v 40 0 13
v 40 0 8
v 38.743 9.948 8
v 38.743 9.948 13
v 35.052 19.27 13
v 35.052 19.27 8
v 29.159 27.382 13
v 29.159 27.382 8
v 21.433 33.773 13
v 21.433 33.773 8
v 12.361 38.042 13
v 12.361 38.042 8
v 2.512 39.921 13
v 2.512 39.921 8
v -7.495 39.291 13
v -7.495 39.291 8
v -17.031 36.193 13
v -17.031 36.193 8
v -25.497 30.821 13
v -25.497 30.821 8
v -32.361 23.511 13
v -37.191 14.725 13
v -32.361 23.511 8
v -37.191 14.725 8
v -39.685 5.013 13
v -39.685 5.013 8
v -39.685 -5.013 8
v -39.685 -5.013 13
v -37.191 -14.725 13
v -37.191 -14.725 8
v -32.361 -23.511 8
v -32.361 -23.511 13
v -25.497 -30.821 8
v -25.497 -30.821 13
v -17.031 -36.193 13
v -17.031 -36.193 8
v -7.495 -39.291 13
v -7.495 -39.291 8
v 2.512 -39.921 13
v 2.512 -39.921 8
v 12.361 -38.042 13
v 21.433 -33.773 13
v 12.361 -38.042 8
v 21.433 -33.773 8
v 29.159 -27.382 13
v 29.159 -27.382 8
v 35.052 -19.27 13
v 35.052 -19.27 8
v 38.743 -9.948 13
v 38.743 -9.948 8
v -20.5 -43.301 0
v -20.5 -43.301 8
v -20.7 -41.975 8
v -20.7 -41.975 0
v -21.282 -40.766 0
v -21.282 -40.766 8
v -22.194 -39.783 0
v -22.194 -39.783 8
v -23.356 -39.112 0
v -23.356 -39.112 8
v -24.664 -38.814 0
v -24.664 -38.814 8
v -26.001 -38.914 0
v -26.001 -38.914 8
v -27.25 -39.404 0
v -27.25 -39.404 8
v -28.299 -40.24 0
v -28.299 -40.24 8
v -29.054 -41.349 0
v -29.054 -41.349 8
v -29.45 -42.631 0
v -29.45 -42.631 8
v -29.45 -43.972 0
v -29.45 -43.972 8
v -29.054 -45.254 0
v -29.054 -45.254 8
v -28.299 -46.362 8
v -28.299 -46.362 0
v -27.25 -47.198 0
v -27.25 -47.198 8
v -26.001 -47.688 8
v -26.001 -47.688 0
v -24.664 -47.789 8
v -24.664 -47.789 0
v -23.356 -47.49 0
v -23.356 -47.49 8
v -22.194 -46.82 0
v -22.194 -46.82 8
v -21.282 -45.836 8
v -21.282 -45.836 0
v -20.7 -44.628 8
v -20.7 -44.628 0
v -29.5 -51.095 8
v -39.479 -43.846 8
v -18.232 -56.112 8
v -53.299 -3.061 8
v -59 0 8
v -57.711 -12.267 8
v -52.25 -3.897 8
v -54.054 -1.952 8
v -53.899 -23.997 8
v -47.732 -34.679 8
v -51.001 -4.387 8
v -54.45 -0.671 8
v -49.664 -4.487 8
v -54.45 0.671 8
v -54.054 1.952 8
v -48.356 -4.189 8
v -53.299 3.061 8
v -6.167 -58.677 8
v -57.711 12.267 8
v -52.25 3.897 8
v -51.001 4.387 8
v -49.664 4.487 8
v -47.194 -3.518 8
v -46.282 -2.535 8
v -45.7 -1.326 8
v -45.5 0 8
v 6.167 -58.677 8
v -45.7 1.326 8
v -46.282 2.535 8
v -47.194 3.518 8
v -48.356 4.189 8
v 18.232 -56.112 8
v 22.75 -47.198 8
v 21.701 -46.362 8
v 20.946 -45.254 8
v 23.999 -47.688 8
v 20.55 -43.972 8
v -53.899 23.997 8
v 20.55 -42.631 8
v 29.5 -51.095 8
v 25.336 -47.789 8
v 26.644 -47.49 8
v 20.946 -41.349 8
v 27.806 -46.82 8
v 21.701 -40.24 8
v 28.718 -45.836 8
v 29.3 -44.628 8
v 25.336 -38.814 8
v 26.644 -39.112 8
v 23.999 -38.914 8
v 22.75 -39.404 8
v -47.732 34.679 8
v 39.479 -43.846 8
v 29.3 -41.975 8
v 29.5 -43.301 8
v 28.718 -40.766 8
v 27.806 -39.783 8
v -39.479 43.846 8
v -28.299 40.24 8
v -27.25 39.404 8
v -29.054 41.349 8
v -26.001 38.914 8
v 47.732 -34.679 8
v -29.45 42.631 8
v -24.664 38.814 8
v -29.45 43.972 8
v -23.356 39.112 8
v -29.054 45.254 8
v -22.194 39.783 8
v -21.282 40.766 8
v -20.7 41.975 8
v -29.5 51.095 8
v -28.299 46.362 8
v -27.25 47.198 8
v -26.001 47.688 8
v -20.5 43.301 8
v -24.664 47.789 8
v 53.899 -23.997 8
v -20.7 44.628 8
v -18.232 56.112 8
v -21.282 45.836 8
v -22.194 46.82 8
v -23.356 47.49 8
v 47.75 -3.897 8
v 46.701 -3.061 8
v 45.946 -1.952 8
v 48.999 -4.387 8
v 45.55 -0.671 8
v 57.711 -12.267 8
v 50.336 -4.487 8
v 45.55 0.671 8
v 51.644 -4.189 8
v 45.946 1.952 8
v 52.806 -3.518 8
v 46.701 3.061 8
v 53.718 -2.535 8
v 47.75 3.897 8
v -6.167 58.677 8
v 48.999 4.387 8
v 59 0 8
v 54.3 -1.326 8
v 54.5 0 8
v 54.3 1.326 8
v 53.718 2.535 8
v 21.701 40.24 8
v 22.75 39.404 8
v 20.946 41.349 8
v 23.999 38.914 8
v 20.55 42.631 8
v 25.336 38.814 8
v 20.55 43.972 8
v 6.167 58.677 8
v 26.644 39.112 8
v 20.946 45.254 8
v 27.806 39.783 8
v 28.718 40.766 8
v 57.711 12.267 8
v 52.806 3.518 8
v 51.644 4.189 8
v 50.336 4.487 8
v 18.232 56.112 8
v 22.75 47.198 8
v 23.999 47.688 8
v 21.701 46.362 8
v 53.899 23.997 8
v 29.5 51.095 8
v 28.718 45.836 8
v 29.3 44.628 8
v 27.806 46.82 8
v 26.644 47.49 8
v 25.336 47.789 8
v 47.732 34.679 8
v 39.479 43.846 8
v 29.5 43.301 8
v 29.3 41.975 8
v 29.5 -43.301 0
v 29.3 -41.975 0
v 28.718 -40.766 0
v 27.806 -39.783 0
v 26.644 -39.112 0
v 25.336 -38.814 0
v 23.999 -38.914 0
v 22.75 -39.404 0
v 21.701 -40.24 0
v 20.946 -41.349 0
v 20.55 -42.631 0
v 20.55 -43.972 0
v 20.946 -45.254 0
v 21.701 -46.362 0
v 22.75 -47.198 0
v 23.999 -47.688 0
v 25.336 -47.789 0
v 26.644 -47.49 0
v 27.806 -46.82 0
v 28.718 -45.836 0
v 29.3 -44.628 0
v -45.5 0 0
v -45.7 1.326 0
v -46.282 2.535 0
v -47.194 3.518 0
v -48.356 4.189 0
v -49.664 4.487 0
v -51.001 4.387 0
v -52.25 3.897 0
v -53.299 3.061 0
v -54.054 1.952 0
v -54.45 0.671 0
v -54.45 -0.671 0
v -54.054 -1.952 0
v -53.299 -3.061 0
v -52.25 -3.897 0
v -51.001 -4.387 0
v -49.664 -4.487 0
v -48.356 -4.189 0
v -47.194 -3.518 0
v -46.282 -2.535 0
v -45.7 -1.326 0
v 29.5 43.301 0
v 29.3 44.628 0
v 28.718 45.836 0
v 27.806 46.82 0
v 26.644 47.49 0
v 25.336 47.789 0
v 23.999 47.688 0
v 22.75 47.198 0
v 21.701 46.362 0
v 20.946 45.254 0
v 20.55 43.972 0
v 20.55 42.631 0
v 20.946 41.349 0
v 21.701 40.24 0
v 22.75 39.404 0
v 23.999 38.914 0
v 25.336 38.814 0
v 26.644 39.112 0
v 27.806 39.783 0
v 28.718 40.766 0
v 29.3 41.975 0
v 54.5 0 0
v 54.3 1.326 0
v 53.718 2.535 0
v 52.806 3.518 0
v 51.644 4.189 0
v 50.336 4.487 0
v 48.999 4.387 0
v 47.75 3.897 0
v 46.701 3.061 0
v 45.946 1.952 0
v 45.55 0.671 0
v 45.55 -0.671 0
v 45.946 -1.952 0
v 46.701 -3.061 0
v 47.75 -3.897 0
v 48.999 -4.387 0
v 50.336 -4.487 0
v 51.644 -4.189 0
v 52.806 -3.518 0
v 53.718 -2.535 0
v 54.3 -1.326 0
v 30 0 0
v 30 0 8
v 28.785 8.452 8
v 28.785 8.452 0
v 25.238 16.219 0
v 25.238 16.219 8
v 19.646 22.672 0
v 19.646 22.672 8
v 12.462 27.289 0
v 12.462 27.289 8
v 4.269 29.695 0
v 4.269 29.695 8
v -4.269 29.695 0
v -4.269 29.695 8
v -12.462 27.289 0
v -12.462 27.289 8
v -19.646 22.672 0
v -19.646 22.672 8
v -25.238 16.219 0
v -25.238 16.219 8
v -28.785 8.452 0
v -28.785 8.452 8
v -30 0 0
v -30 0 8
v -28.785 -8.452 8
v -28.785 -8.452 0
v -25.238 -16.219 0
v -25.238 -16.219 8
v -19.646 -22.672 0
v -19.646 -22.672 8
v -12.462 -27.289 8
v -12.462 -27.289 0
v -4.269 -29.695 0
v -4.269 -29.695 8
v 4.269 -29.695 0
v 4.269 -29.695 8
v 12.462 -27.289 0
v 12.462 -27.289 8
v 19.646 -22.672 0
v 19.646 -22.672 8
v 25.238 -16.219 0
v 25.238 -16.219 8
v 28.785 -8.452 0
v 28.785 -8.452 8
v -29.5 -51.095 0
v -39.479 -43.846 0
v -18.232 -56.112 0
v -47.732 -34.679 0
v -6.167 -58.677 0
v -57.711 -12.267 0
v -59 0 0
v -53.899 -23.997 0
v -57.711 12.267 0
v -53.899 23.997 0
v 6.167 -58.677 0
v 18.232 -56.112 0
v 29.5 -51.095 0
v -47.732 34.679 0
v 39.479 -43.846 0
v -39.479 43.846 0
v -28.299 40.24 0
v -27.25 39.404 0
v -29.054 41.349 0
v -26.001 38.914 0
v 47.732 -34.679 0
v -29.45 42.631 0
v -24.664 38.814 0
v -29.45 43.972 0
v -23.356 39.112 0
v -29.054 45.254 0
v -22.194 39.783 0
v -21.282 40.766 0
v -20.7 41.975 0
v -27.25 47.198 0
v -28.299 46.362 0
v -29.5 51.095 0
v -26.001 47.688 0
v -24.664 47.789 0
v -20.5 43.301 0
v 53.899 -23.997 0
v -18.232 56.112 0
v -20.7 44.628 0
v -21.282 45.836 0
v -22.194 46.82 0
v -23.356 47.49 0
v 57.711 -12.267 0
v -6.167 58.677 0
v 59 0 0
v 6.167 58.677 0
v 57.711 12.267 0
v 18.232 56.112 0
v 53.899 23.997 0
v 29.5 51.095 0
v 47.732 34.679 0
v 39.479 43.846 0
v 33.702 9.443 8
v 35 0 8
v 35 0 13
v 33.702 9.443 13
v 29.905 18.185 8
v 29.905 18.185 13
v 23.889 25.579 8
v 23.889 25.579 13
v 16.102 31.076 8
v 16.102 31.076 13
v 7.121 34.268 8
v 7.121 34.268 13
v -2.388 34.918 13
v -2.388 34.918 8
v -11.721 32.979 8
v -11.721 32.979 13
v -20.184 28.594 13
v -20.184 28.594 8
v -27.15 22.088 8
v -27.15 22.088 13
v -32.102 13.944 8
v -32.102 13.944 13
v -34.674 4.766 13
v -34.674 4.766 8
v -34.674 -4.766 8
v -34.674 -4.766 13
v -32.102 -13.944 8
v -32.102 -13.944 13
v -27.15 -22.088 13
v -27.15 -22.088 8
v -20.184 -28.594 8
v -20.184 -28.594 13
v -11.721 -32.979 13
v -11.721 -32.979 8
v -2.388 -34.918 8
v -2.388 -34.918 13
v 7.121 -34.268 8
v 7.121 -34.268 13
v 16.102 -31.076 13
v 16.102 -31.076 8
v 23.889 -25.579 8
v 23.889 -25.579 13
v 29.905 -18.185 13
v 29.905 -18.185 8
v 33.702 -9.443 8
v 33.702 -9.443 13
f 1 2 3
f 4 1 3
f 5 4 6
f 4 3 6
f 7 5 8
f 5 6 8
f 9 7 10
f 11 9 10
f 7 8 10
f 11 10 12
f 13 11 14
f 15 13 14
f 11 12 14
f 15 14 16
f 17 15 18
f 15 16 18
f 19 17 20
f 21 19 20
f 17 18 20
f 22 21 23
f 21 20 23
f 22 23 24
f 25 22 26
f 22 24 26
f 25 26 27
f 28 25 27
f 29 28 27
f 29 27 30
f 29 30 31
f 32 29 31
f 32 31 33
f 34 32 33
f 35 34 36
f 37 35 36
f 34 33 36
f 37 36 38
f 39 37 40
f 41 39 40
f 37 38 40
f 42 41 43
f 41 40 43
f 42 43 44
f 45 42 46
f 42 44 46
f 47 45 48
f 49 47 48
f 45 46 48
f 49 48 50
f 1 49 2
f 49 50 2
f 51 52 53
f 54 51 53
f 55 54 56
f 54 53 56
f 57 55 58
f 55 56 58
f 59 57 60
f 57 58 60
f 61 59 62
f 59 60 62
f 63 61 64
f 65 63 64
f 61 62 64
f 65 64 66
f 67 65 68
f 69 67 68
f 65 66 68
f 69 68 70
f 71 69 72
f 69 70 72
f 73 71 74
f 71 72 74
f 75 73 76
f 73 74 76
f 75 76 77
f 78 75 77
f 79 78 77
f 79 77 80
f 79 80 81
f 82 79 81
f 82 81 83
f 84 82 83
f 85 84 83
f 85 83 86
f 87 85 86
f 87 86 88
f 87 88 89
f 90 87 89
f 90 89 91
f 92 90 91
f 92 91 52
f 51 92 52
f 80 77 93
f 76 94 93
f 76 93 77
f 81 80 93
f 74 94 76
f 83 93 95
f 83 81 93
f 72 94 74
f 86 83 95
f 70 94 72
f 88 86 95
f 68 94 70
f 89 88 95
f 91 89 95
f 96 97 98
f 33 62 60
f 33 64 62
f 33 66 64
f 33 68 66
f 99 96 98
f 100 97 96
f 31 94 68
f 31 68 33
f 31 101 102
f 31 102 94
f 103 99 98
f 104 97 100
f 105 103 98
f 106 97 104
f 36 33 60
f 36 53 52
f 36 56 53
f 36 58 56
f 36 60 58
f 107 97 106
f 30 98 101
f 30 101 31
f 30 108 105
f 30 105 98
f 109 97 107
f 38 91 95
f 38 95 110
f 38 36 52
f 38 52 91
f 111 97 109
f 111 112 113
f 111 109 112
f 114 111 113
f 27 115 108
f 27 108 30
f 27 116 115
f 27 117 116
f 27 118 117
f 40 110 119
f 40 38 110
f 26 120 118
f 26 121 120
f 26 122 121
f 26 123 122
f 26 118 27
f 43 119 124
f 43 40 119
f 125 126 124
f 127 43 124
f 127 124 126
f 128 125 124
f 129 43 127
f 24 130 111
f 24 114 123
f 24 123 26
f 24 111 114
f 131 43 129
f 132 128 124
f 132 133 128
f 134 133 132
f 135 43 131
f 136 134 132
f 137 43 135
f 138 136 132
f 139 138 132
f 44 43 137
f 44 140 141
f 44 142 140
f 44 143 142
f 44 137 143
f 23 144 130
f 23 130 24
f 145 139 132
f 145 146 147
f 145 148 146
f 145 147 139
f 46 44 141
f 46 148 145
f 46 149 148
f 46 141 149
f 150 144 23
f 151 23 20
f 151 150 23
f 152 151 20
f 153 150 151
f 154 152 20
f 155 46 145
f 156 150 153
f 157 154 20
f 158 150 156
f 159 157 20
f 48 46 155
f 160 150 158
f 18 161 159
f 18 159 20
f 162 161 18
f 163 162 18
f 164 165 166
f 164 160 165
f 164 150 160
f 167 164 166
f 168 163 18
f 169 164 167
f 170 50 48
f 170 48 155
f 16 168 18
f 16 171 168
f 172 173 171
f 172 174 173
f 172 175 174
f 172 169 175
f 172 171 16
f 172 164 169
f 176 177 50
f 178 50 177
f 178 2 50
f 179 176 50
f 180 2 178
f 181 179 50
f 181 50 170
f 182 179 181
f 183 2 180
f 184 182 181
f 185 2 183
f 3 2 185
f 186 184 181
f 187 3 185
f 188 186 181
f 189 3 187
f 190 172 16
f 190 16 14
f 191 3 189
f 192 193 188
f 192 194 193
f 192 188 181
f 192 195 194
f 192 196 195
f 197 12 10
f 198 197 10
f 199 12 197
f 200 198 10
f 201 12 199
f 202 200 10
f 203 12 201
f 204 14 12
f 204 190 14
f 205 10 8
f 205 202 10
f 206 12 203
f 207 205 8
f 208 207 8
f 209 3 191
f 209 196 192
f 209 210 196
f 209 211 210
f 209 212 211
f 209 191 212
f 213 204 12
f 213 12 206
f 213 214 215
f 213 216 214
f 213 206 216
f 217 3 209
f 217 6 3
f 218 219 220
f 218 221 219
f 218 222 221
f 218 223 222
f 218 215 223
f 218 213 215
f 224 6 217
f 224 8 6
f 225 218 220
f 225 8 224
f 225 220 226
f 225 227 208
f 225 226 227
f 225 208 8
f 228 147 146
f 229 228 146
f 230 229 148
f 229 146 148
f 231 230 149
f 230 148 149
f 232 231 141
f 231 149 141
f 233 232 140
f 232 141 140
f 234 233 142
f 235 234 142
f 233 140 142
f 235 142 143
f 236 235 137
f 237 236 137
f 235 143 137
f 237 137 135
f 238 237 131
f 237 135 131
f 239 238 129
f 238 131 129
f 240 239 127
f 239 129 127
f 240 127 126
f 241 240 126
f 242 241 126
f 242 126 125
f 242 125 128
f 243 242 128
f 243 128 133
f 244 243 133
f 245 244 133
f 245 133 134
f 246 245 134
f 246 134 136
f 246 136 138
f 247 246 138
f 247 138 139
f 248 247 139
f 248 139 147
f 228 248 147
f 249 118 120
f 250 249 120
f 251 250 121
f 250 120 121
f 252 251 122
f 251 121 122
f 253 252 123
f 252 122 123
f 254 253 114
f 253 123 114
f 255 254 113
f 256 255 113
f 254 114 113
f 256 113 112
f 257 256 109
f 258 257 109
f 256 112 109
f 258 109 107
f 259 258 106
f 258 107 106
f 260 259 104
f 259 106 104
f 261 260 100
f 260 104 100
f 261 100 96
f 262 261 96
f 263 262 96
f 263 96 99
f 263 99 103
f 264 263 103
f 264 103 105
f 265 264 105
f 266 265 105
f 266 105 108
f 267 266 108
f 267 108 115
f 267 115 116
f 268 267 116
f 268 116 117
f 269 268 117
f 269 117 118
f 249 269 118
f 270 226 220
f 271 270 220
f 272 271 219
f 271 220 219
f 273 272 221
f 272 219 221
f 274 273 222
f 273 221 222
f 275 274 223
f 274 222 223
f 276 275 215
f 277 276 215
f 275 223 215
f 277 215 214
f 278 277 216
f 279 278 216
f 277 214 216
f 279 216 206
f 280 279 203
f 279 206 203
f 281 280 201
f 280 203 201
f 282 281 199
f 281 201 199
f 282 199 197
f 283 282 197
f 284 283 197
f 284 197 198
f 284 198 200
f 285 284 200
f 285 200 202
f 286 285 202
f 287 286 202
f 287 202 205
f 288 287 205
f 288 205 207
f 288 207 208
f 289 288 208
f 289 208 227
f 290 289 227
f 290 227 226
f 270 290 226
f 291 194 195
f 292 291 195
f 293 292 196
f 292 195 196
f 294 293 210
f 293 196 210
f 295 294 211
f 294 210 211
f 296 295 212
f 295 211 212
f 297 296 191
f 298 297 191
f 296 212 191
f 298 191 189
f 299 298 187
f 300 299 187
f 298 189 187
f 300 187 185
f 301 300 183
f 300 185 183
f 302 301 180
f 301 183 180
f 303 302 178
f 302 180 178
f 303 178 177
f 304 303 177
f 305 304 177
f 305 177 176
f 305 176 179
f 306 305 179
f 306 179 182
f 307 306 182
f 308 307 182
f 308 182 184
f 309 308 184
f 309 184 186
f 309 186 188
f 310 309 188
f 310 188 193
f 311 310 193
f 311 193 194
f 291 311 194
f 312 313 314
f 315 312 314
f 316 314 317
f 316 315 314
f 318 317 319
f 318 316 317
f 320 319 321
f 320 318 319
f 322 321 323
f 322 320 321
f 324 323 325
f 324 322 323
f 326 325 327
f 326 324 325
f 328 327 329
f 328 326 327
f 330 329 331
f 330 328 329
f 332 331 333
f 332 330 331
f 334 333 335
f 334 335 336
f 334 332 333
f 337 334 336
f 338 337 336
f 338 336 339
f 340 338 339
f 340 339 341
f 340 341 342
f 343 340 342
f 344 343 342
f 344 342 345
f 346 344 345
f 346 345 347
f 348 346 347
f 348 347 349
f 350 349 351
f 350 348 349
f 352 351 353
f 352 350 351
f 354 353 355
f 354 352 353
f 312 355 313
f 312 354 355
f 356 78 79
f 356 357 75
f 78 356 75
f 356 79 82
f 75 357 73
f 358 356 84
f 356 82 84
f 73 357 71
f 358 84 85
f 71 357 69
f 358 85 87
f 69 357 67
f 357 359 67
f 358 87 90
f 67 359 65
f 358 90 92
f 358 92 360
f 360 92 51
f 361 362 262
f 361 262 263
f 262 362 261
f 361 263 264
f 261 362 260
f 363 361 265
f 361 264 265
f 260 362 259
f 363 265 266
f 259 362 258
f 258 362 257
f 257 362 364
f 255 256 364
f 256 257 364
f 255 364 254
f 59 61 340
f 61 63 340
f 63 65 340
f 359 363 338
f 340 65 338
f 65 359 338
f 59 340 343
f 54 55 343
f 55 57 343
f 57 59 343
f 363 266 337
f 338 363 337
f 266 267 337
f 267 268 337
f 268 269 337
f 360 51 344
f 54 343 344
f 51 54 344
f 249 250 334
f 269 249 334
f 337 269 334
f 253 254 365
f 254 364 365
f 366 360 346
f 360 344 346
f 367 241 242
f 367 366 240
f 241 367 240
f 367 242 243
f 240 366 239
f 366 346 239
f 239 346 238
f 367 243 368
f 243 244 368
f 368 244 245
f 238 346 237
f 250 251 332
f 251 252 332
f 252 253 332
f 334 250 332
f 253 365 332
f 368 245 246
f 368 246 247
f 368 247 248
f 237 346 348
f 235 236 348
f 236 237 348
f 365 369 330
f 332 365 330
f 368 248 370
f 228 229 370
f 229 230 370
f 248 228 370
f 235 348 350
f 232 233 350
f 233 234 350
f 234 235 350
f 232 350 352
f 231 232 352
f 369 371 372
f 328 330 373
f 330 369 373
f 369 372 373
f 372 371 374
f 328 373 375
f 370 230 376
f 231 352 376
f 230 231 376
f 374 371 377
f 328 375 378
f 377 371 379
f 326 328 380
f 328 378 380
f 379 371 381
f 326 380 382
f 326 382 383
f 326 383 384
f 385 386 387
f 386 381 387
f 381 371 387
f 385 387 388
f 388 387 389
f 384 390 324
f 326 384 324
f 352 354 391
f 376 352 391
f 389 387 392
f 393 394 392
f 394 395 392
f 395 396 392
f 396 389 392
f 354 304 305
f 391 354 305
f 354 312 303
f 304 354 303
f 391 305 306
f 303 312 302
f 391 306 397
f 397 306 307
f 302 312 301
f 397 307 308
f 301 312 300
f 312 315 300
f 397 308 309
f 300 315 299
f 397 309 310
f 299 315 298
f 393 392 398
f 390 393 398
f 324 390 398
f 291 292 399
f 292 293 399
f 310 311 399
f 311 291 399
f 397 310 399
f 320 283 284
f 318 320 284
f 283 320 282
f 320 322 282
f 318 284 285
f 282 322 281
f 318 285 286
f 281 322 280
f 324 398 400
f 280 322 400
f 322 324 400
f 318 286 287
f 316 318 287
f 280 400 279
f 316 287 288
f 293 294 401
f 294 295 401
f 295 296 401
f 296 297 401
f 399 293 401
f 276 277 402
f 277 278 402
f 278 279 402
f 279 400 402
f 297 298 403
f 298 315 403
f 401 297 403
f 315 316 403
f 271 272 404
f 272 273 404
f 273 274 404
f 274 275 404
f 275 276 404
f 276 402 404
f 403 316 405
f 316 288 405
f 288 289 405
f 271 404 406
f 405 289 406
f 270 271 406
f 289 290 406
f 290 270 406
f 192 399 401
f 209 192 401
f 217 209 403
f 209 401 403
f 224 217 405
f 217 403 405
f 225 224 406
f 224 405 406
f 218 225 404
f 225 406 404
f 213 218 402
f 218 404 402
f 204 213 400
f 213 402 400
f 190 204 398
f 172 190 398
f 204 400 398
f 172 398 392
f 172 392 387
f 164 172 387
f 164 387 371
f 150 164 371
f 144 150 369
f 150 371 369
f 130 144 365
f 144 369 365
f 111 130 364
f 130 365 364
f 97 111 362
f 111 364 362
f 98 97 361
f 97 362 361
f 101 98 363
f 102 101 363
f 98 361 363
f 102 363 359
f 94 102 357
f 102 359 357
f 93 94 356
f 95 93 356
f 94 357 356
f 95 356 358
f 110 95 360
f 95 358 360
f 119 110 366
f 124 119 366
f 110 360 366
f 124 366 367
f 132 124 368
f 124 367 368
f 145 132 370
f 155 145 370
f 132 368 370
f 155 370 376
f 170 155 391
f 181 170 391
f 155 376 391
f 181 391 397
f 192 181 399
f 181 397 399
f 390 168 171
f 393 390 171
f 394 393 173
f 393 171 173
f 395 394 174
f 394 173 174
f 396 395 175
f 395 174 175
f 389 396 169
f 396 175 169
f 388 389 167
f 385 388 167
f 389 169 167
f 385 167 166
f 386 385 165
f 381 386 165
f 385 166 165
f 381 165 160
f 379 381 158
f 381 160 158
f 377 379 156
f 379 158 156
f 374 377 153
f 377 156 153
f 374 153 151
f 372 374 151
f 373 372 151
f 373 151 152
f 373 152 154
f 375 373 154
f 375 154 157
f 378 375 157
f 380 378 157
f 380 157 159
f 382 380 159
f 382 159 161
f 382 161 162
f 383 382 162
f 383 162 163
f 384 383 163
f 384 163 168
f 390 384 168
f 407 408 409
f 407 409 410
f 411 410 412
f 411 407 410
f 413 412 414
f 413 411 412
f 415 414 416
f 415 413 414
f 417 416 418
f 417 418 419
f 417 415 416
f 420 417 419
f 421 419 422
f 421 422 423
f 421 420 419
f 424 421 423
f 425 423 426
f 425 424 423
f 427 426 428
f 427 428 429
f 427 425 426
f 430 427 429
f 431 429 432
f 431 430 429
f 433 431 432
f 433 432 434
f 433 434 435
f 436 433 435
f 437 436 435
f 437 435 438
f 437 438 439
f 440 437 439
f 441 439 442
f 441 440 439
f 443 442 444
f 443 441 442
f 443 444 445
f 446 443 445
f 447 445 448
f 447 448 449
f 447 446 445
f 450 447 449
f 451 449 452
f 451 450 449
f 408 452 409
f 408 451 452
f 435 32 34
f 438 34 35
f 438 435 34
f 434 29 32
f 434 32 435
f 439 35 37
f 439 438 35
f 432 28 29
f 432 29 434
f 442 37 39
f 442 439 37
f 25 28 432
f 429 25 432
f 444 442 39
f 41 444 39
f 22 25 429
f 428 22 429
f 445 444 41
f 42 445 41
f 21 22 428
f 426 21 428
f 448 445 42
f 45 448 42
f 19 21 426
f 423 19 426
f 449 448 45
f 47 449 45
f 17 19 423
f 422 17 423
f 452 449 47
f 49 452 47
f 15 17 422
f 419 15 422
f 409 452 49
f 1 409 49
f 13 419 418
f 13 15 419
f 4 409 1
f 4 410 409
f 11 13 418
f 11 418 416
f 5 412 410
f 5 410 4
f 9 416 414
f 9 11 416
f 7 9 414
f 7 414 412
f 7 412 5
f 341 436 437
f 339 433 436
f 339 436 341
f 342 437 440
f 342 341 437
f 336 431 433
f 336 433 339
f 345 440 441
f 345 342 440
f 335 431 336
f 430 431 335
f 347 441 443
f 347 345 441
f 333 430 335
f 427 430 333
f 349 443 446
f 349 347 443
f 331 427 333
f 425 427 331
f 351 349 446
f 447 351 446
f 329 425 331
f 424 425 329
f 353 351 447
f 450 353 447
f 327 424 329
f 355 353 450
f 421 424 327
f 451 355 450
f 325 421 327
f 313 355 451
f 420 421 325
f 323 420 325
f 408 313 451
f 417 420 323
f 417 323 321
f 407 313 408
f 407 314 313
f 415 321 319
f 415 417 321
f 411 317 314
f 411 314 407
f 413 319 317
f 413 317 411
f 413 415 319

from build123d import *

# Parameters (mm, degrees)
SKETCH_1_R                      = 59
SKETCH_1_R_2                    = 30
EXTRUDE_1_DEPTH                 = 8
SKETCH_2_R                      = 40
SKETCH_2_R_2                    = 35
EXTRUDE_2_DEPTH                 = 5
CUT_EXTRUDE_1_REACH             = 85.821
SKETCH_3_R                      = 4.5
CUT_EXTRUDE_1_DIRECTION_2_DEPTH = 84.821238359


with BuildPart() as part:
    # 草图1 → 凸台-拉伸1 (new body)
    with BuildSketch(Plane.XY):
        Circle(SKETCH_1_R)
        Circle(SKETCH_1_R_2, mode=Mode.SUBTRACT)
    extrude(amount=EXTRUDE_1_DEPTH)

    # 草图2 → 凸台-拉伸2 (add)
    with BuildSketch(Plane.XY.offset(8)):
        Circle(SKETCH_2_R)
        Circle(SKETCH_2_R_2, mode=Mode.SUBTRACT)
    extrude(amount=EXTRUDE_2_DEPTH)

    # 草图3 → 切除-拉伸1 (cut, up to next)
    with BuildSketch(Plane.XY.offset(8), mode=Mode.PRIVATE) as cut_extrude_1_sk1:
        with Locations((25, 43.301270189)):
            Circle(SKETCH_3_R)
    cut_extrude_1_tool1 = extrude(cut_extrude_1_sk1.sketch, amount=-CUT_EXTRUDE_1_REACH, mode=Mode.PRIVATE) & part.part
    # 草图3 → 切除-拉伸1 (cut, up to next)
    with BuildSketch(Plane.XY.offset(8), mode=Mode.PRIVATE) as cut_extrude_1_sk2:
        with Locations((50, 0)):
            Circle(SKETCH_3_R)
    cut_extrude_1_tool2 = extrude(cut_extrude_1_sk2.sketch, amount=-CUT_EXTRUDE_1_REACH, mode=Mode.PRIVATE) & part.part
    # 草图3 → 切除-拉伸1 (cut, up to next)
    with BuildSketch(Plane.XY.offset(8), mode=Mode.PRIVATE) as cut_extrude_1_sk3:
        with Locations((25, -43.301270189)):
            Circle(SKETCH_3_R)
    cut_extrude_1_tool3 = extrude(cut_extrude_1_sk3.sketch, amount=-CUT_EXTRUDE_1_REACH, mode=Mode.PRIVATE) & part.part
    # 草图3 → 切除-拉伸1 (cut, up to next)
    with BuildSketch(Plane.XY.offset(8), mode=Mode.PRIVATE) as cut_extrude_1_sk4:
        with Locations((-25, -43.301270189)):
            Circle(SKETCH_3_R)
    cut_extrude_1_tool4 = extrude(cut_extrude_1_sk4.sketch, amount=-CUT_EXTRUDE_1_REACH, mode=Mode.PRIVATE) & part.part
    # 草图3 → 切除-拉伸1 (cut, up to next)
    with BuildSketch(Plane.XY.offset(8), mode=Mode.PRIVATE) as cut_extrude_1_sk5:
        with Locations((-50, 0)):
            Circle(SKETCH_3_R)
    cut_extrude_1_tool5 = extrude(cut_extrude_1_sk5.sketch, amount=-CUT_EXTRUDE_1_REACH, mode=Mode.PRIVATE) & part.part
    # 草图3 → 切除-拉伸1 (cut, up to next)
    with BuildSketch(Plane.XY.offset(8), mode=Mode.PRIVATE) as cut_extrude_1_sk6:
        with Locations((-25, 43.301270189)):
            Circle(SKETCH_3_R)
    cut_extrude_1_tool6 = extrude(cut_extrude_1_sk6.sketch, amount=-CUT_EXTRUDE_1_REACH, mode=Mode.PRIVATE) & part.part
    add(cut_extrude_1_tool1.solids().sort_by_distance((25, 43.30127, 8))[0], mode=Mode.SUBTRACT)
    add(cut_extrude_1_tool2.solids().sort_by_distance((50, 0, 8))[0], mode=Mode.SUBTRACT)
    add(cut_extrude_1_tool3.solids().sort_by_distance((25, -43.30127, 8))[0], mode=Mode.SUBTRACT)
    add(cut_extrude_1_tool4.solids().sort_by_distance((-25, -43.30127, 8))[0], mode=Mode.SUBTRACT)
    add(cut_extrude_1_tool5.solids().sort_by_distance((-50, 0, 8))[0], mode=Mode.SUBTRACT)
    add(cut_extrude_1_tool6.solids().sort_by_distance((-25, 43.30127, 8))[0], mode=Mode.SUBTRACT)

    # 草图3 → 切除-拉伸1 direction 2 (cut)
    with BuildSketch(Plane.XY.offset(8)):
        with Locations((25, 43.301270189)):
            Circle(SKETCH_3_R)
        with Locations((50, 0)):
            Circle(SKETCH_3_R)
        with Locations((25, -43.301270189)):
            Circle(SKETCH_3_R)
        with Locations((-25, -43.301270189)):
            Circle(SKETCH_3_R)
        with Locations((-50, 0)):
            Circle(SKETCH_3_R)
        with Locations((-25, 43.301270189)):
            Circle(SKETCH_3_R)
    extrude(amount=CUT_EXTRUDE_1_DIRECTION_2_DEPTH, mode=Mode.SUBTRACT)


solid = part.part
